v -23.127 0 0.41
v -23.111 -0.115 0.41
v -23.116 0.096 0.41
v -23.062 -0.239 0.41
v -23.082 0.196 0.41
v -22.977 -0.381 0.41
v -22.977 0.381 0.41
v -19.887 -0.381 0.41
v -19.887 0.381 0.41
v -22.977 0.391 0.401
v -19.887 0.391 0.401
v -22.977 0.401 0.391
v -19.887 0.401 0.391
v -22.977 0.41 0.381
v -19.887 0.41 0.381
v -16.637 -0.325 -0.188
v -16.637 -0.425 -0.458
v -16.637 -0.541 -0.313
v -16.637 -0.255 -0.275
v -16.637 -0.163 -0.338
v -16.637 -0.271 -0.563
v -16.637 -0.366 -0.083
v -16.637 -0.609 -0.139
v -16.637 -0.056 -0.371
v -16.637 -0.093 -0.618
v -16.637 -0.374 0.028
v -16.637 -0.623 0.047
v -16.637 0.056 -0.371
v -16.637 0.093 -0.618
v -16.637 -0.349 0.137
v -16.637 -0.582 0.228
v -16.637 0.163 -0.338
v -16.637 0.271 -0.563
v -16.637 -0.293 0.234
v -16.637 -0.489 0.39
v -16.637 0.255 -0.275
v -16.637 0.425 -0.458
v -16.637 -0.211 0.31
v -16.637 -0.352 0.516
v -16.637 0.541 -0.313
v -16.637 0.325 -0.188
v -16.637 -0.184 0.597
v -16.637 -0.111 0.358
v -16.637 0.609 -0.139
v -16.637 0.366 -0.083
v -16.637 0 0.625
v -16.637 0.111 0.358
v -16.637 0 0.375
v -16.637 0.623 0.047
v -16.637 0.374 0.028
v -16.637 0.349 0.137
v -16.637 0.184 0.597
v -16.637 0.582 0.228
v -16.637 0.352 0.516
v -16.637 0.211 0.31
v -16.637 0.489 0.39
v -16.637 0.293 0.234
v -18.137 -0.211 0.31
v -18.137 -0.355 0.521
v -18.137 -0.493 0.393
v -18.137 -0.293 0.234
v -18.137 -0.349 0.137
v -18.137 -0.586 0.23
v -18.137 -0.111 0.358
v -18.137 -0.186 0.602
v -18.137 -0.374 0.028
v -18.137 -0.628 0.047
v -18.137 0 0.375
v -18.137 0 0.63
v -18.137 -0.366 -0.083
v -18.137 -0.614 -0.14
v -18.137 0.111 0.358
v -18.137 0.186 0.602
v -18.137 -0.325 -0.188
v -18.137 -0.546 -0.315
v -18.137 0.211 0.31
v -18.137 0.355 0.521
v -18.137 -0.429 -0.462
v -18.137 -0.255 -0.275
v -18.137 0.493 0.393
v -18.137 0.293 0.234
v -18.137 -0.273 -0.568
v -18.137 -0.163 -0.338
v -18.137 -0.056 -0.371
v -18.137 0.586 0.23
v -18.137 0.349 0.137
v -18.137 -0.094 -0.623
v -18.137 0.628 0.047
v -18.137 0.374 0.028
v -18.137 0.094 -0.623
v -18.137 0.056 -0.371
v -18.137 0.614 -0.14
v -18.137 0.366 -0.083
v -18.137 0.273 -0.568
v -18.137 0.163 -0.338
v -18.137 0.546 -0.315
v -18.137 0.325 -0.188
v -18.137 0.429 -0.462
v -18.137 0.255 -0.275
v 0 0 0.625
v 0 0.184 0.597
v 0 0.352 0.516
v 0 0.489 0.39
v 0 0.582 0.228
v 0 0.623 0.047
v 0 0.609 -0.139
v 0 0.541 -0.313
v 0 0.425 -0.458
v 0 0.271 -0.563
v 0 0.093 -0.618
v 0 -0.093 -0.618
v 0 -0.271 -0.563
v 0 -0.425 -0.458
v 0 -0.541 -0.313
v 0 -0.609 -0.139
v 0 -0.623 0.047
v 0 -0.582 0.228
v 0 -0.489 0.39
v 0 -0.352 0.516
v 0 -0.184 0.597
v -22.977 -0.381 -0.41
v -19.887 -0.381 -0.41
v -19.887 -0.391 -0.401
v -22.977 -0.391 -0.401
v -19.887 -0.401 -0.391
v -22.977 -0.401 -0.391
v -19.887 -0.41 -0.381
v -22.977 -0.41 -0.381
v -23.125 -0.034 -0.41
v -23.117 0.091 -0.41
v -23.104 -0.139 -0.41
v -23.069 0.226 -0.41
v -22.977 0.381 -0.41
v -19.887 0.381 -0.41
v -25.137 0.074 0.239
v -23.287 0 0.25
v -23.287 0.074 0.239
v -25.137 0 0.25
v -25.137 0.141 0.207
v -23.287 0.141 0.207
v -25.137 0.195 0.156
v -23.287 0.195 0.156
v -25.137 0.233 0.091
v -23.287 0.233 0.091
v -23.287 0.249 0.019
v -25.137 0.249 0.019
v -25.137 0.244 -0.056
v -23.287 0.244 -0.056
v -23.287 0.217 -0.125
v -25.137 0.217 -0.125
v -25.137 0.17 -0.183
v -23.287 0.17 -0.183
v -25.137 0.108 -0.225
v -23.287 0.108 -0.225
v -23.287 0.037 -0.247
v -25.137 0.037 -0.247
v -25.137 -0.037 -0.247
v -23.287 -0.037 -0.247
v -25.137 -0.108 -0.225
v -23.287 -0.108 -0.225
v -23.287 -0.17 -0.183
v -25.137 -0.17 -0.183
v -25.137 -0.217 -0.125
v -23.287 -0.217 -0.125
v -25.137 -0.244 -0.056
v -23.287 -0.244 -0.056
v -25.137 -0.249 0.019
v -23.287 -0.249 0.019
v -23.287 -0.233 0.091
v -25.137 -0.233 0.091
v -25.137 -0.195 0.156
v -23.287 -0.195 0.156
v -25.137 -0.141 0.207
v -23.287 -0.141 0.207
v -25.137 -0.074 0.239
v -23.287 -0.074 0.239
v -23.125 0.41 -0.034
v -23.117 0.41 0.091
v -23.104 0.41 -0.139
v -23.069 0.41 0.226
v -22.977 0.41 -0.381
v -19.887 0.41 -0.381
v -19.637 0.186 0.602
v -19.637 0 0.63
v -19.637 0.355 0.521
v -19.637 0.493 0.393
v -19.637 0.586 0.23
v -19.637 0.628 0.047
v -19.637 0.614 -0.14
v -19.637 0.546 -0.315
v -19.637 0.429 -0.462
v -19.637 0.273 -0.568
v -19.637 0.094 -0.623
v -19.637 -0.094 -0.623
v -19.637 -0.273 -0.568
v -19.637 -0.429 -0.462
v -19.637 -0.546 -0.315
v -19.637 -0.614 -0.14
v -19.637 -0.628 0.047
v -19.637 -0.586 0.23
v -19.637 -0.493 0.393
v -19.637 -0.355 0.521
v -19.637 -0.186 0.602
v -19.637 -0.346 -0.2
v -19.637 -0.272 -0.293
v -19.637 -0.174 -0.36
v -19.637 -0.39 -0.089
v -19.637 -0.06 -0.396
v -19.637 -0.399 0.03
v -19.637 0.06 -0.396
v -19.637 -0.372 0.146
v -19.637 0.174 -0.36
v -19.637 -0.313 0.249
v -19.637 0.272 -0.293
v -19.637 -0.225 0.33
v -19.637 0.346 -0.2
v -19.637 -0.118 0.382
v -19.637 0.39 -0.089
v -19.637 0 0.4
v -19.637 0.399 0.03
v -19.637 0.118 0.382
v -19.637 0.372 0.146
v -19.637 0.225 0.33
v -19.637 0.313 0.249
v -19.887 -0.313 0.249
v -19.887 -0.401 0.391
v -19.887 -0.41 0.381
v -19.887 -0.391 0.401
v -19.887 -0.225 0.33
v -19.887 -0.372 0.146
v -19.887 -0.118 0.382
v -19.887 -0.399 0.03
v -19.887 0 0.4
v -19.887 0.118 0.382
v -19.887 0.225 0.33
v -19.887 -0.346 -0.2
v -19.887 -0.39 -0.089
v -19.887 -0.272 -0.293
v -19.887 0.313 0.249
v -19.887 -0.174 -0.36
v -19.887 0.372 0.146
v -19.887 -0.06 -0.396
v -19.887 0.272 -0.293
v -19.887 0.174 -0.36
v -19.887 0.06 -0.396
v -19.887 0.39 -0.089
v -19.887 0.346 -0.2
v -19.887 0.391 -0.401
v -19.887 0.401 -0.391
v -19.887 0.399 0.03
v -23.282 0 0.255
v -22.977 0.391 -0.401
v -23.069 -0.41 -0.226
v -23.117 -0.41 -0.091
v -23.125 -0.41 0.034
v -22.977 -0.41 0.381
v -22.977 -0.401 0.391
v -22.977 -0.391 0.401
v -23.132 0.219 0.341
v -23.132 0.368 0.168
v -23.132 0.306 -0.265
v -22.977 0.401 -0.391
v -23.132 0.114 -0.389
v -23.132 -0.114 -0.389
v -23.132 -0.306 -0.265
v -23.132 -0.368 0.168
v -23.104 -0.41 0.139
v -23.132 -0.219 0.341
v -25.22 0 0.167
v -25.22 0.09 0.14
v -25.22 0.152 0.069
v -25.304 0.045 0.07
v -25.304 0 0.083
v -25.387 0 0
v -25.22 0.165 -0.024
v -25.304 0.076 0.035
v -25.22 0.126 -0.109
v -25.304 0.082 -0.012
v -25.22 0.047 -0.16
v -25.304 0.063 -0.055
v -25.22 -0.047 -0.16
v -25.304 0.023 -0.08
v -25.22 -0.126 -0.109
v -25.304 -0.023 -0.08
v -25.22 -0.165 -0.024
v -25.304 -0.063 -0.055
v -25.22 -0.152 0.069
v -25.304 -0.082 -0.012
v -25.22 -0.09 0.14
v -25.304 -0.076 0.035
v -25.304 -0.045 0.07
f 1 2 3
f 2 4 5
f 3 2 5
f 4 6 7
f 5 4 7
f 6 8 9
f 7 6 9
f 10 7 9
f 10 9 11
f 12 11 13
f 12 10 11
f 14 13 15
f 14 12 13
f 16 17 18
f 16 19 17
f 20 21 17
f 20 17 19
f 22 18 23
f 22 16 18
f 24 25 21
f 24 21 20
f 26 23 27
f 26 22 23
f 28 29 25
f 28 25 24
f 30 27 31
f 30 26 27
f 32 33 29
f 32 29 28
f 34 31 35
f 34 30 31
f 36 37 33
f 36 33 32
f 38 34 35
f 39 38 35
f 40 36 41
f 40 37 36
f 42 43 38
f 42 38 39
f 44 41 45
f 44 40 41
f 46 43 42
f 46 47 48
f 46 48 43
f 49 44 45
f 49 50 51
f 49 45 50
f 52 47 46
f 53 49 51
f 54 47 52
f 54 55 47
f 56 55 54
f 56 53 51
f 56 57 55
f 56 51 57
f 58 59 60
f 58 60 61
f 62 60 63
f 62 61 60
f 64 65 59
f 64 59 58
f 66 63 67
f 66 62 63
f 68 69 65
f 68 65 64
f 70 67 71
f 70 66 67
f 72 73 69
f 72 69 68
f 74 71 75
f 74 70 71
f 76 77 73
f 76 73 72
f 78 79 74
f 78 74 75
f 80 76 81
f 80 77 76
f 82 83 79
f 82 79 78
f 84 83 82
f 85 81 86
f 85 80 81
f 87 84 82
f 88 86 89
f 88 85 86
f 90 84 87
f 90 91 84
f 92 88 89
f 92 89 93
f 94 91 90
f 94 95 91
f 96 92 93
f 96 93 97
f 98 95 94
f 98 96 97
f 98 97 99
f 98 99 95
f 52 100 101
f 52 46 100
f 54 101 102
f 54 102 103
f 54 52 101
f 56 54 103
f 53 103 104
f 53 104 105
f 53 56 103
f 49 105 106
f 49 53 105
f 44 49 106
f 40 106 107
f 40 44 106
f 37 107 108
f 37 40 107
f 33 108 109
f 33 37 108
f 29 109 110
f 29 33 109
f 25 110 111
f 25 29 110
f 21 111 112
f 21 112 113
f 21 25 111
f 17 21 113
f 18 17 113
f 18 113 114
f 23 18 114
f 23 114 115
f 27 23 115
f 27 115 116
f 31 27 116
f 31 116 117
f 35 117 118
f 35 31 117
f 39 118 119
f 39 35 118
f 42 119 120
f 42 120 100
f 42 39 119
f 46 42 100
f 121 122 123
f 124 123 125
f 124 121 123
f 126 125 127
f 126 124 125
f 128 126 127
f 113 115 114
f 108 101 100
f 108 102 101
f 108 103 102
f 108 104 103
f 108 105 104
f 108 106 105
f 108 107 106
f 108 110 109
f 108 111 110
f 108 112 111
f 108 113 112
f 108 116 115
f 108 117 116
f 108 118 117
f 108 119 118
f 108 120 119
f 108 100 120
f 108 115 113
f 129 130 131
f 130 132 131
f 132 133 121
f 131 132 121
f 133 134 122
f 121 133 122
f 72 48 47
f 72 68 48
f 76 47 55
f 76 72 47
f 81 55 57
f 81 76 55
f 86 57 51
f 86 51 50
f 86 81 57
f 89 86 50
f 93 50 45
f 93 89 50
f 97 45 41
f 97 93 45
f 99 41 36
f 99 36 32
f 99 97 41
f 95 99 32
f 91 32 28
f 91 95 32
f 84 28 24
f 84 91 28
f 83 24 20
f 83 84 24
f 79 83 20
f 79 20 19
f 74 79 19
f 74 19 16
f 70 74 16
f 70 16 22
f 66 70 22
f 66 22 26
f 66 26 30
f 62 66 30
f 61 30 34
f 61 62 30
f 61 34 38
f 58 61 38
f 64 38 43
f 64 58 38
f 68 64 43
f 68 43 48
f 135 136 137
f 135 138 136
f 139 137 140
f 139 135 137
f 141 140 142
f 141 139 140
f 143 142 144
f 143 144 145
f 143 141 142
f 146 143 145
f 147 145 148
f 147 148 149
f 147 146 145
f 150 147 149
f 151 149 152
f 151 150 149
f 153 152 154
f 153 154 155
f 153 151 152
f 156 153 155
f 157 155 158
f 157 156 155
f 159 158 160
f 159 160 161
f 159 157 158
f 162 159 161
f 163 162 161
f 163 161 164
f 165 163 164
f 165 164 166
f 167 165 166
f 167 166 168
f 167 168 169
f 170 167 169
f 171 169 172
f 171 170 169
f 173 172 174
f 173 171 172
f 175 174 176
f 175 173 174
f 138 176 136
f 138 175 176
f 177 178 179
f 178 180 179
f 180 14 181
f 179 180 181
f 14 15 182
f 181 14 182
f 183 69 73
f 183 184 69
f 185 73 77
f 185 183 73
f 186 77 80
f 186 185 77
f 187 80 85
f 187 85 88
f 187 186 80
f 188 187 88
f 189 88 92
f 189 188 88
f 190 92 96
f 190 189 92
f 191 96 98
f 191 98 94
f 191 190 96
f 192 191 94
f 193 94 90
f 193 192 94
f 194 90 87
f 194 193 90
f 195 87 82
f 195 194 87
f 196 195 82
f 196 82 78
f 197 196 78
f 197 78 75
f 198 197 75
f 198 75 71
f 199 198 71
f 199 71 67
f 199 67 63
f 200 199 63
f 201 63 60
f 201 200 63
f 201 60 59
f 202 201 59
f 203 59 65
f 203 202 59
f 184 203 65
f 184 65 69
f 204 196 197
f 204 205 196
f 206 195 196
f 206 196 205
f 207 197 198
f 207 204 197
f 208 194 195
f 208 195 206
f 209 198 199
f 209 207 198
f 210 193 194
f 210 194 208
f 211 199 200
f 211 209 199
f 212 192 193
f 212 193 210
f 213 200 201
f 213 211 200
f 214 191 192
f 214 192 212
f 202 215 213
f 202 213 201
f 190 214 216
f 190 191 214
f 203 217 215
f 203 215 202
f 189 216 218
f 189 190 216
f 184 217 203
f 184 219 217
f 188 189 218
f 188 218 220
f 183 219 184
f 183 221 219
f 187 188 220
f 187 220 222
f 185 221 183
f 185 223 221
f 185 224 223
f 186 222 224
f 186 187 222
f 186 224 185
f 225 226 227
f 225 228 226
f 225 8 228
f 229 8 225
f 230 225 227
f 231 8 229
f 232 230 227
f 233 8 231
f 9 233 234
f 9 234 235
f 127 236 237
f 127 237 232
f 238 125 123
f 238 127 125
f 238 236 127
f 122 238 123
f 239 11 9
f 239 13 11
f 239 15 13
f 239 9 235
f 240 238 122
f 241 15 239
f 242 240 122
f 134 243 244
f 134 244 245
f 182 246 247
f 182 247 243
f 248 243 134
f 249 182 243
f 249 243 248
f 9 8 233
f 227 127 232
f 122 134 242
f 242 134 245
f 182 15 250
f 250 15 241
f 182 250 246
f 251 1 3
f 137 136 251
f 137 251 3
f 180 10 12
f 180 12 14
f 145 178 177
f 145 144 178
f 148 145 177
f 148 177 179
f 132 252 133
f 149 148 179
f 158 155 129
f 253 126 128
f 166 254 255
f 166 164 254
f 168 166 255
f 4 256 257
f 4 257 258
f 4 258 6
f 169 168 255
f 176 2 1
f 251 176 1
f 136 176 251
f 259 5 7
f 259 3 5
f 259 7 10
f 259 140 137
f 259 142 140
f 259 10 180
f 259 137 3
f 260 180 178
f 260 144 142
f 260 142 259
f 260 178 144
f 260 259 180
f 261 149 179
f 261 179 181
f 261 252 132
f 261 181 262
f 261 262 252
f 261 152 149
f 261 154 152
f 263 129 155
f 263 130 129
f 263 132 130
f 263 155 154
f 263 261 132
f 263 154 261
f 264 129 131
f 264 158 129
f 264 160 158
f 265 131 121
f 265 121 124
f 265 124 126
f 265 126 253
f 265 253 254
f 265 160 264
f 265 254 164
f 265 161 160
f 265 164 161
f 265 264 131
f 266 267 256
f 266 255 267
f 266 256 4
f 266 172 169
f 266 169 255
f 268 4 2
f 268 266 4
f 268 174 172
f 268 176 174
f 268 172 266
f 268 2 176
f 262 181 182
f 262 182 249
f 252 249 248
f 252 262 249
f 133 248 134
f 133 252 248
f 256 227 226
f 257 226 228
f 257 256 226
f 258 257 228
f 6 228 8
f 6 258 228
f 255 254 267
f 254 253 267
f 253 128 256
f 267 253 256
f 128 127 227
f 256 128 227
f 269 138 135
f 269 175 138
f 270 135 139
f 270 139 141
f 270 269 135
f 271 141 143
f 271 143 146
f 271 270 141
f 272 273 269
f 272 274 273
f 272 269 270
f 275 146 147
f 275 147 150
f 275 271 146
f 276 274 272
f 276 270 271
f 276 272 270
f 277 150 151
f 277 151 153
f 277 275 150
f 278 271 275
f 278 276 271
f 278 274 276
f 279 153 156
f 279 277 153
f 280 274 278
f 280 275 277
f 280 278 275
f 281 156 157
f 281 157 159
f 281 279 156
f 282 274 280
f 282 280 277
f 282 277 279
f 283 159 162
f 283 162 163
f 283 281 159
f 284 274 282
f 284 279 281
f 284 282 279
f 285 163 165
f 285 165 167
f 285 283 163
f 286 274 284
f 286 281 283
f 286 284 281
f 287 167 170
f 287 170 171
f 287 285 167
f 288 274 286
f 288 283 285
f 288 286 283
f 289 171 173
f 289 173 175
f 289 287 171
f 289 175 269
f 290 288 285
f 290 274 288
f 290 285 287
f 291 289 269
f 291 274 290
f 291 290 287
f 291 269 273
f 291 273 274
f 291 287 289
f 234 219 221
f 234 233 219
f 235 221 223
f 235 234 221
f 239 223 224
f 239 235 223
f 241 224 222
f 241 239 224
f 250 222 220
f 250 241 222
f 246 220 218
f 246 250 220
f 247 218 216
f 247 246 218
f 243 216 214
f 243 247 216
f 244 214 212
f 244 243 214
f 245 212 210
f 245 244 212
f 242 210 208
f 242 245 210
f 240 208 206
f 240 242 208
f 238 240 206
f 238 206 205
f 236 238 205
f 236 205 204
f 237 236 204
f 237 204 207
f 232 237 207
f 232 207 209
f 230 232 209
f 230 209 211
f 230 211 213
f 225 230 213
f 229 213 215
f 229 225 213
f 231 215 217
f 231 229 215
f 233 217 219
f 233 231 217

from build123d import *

# Parameters (mm, degrees)
F2_R     = 0.994753
F3_DEPTH = 5.501


with BuildPart() as f1:
    # F0 (on Front) → F1 (revolve)
    with BuildSketch(Plane.XZ):
        Polygon((-25.386839, 0), (0, 0), (0, 0.625), (-16.636839, 0.625), (-16.636839, 0.375), (-18.136839, 0.375), (-18.136839, 0.63), (-19.636839, 0.63), (-19.636839, 0.4), (-19.886839, 0.4), (-19.886839, 0.56), (-22.976839, 0.56), (-23.286839, 0.25), (-25.136839, 0.25), align=None)
    revolve(axis=Axis((-12.69342, 0, 0), (-1, 0, 0)))

    # F2 (on face) → F3 (cut, through all)
    with BuildSketch(Plane.YZ.offset(-19.886839)):
        Circle(F2_R)
        Polygon((-0.41, 0.41), (0, 0.41), (0.41, 0.41), (0.41, 0), (0.41, -0.41), (0, -0.41), (-0.41, -0.41), (-0.41, 0), align=None, mode=Mode.SUBTRACT)
    extrude(amount=-F3_DEPTH, mode=Mode.SUBTRACT)


solid = f1.part
